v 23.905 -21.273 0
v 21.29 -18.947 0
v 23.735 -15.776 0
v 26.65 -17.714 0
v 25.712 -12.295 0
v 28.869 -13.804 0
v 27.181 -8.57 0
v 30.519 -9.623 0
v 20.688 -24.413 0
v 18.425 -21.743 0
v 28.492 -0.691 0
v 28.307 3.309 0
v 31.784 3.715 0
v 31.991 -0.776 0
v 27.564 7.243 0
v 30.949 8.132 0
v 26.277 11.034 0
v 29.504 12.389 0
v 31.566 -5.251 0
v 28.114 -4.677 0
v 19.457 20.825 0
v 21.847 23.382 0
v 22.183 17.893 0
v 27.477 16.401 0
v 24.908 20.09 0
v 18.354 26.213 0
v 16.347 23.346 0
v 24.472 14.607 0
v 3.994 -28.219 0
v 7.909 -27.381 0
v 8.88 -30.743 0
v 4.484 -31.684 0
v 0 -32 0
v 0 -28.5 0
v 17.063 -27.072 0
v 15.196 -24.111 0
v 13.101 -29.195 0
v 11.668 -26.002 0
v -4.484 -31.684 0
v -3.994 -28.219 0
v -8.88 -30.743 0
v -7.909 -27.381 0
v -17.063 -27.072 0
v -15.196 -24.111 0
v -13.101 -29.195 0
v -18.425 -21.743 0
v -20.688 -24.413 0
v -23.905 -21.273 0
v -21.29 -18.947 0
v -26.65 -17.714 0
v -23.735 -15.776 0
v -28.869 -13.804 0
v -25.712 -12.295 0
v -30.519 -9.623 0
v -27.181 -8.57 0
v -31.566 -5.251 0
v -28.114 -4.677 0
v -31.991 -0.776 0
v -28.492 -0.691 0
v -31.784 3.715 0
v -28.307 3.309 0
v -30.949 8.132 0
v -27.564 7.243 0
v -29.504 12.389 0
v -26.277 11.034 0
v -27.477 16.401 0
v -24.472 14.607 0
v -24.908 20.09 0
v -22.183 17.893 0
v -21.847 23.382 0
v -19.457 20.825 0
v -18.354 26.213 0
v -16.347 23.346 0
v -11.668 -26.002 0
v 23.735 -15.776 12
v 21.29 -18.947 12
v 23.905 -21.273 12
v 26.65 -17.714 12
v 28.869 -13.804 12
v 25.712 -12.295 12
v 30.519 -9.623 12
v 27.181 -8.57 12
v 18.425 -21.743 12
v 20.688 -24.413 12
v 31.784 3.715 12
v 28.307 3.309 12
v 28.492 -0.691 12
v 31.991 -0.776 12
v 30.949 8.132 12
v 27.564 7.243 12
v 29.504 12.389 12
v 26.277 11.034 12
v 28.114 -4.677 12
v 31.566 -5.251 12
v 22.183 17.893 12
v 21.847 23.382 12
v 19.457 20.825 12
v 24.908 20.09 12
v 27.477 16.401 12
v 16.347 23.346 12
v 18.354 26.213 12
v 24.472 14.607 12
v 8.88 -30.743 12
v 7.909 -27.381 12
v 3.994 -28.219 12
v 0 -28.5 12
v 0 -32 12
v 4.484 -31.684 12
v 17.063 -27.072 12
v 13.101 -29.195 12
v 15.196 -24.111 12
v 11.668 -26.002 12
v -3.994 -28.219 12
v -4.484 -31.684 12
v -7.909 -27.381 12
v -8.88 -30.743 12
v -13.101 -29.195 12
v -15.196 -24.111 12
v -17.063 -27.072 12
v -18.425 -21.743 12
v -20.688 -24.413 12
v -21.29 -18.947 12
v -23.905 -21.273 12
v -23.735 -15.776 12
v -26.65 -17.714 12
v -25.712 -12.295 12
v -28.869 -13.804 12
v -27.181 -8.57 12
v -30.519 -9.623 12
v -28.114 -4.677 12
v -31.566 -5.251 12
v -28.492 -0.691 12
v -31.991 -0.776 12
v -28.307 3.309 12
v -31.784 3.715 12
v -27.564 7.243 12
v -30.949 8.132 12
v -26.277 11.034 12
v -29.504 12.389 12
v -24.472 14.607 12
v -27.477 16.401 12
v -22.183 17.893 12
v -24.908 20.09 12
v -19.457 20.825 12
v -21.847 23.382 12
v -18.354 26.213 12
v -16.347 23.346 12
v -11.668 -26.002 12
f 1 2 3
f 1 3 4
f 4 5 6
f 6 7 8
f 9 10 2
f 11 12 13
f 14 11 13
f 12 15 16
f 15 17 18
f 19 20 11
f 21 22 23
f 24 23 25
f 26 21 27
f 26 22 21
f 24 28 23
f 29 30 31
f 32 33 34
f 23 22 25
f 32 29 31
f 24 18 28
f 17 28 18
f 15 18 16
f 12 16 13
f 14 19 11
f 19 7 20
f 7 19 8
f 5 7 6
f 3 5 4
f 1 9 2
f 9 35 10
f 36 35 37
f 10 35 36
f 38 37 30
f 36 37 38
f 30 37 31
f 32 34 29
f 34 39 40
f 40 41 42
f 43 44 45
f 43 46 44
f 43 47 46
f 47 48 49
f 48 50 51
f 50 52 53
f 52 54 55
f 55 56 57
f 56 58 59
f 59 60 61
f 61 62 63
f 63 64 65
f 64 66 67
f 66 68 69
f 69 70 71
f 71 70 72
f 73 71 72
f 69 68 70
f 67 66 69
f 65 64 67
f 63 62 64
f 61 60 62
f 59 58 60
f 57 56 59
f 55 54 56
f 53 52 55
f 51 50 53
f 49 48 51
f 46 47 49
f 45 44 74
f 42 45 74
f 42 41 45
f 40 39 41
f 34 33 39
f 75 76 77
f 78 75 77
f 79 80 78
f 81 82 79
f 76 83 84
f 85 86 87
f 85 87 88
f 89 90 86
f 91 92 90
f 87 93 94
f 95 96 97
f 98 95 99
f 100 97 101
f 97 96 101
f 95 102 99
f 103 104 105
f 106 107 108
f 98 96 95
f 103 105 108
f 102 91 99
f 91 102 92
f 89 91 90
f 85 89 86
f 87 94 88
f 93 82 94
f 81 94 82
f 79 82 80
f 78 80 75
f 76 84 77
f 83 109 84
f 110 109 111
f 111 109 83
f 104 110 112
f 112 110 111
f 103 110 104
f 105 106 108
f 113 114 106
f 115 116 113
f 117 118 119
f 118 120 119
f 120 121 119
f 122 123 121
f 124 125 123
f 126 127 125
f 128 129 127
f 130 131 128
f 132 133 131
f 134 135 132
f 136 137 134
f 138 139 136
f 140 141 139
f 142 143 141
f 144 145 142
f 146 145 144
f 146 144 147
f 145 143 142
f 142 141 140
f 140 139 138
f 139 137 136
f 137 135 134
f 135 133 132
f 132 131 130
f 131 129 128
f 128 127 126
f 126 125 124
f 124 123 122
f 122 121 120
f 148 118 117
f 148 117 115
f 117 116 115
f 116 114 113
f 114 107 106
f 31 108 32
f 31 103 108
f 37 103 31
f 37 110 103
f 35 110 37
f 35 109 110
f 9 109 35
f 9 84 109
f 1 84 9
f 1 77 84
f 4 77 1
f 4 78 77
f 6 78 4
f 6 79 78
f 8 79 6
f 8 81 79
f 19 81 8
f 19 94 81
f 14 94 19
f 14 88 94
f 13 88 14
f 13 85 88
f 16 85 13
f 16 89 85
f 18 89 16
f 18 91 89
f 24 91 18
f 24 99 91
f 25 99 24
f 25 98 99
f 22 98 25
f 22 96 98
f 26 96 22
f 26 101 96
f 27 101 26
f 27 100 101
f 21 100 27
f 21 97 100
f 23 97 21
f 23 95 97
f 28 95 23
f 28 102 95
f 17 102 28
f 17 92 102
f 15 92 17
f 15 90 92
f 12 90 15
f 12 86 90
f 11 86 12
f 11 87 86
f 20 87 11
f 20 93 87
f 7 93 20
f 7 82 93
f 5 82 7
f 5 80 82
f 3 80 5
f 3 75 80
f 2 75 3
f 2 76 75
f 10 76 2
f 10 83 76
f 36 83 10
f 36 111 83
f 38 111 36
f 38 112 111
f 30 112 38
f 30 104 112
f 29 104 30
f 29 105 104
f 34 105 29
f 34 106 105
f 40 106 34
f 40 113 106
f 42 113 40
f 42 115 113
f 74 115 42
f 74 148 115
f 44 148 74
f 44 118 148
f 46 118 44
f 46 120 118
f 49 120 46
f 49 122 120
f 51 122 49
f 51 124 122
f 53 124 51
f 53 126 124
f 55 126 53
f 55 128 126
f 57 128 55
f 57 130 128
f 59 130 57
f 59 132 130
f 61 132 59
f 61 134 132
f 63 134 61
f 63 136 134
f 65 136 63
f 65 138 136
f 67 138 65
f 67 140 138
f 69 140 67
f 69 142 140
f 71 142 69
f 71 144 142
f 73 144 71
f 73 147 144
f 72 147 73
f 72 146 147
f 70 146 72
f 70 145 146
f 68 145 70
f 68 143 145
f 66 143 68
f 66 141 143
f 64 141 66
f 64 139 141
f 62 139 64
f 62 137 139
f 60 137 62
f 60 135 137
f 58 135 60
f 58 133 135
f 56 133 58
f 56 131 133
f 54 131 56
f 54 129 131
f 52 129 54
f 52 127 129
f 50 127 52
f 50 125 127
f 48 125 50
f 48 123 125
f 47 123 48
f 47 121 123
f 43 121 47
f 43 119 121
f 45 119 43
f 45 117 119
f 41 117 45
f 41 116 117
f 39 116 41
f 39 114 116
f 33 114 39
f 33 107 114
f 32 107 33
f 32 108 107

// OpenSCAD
$fn = 32;

// ----------------------------------------------------------------------
// Spring clip: 64 mm outside, 3.5 mm band, 70 degree opening
// ----------------------------------------------------------------------

// --- parameters (mm) ---
outer_r = 32;             // clip outside radius
inner_r = 28.5;           // clip bore radius
band = 3.5;               // band thickness
clip_w = 12;              // clip width
opening = 70;             // opening angle

clip_profile = [[-18.354, 26.213], [-21.847, 23.382], [-24.908, 20.09], [-27.477, 16.401], [-29.504, 12.389], [-30.949, 8.132], [-31.784, 3.715], [-31.991, -0.776], [-31.566, -5.251], [-30.519, -9.623], [-28.869, -13.804], [-26.65, -17.714], [-23.905, -21.273], [-20.688, -24.413], [-17.063, -27.072], [-13.101, -29.195], [-8.88, -30.743], [-4.484, -31.684], [0, -32], [4.484, -31.684], [8.88, -30.743], [13.101, -29.195], [17.063, -27.072], [20.688, -24.413], [23.905, -21.273], [26.65, -17.714], [28.869, -13.804], [30.519, -9.623], [31.566, -5.251], [31.991, -0.776], [31.784, 3.715], [30.949, 8.132], [29.504, 12.389], [27.477, 16.401], [24.908, 20.09], [21.847, 23.382], [18.354, 26.213], [16.347, 23.346], [19.457, 20.825], [22.183, 17.893], [24.472, 14.607], [26.277, 11.034], [27.564, 7.243], [28.307, 3.309], [28.492, -0.691], [28.114, -4.677], [27.181, -8.57], [25.712, -12.295], [23.735, -15.776], [21.29, -18.947], [18.425, -21.743], [15.196, -24.111], [11.668, -26.002], [7.909, -27.381], [3.994, -28.219], [0, -28.5], [-3.994, -28.219], [-7.909, -27.381], [-11.668, -26.002], [-15.196, -24.111], [-18.425, -21.743], [-21.29, -18.947], [-23.735, -15.776], [-25.712, -12.295], [-27.181, -8.57], [-28.114, -4.677], [-28.492, -0.691], [-28.307, 3.309], [-27.564, 7.243], [-26.277, 11.034], [-24.472, 14.607], [-22.183, 17.893], [-19.457, 20.825], [-16.347, 23.346]];

difference() {
  union() {
    linear_extrude(height = clip_w) polygon(clip_profile);
  }
}
